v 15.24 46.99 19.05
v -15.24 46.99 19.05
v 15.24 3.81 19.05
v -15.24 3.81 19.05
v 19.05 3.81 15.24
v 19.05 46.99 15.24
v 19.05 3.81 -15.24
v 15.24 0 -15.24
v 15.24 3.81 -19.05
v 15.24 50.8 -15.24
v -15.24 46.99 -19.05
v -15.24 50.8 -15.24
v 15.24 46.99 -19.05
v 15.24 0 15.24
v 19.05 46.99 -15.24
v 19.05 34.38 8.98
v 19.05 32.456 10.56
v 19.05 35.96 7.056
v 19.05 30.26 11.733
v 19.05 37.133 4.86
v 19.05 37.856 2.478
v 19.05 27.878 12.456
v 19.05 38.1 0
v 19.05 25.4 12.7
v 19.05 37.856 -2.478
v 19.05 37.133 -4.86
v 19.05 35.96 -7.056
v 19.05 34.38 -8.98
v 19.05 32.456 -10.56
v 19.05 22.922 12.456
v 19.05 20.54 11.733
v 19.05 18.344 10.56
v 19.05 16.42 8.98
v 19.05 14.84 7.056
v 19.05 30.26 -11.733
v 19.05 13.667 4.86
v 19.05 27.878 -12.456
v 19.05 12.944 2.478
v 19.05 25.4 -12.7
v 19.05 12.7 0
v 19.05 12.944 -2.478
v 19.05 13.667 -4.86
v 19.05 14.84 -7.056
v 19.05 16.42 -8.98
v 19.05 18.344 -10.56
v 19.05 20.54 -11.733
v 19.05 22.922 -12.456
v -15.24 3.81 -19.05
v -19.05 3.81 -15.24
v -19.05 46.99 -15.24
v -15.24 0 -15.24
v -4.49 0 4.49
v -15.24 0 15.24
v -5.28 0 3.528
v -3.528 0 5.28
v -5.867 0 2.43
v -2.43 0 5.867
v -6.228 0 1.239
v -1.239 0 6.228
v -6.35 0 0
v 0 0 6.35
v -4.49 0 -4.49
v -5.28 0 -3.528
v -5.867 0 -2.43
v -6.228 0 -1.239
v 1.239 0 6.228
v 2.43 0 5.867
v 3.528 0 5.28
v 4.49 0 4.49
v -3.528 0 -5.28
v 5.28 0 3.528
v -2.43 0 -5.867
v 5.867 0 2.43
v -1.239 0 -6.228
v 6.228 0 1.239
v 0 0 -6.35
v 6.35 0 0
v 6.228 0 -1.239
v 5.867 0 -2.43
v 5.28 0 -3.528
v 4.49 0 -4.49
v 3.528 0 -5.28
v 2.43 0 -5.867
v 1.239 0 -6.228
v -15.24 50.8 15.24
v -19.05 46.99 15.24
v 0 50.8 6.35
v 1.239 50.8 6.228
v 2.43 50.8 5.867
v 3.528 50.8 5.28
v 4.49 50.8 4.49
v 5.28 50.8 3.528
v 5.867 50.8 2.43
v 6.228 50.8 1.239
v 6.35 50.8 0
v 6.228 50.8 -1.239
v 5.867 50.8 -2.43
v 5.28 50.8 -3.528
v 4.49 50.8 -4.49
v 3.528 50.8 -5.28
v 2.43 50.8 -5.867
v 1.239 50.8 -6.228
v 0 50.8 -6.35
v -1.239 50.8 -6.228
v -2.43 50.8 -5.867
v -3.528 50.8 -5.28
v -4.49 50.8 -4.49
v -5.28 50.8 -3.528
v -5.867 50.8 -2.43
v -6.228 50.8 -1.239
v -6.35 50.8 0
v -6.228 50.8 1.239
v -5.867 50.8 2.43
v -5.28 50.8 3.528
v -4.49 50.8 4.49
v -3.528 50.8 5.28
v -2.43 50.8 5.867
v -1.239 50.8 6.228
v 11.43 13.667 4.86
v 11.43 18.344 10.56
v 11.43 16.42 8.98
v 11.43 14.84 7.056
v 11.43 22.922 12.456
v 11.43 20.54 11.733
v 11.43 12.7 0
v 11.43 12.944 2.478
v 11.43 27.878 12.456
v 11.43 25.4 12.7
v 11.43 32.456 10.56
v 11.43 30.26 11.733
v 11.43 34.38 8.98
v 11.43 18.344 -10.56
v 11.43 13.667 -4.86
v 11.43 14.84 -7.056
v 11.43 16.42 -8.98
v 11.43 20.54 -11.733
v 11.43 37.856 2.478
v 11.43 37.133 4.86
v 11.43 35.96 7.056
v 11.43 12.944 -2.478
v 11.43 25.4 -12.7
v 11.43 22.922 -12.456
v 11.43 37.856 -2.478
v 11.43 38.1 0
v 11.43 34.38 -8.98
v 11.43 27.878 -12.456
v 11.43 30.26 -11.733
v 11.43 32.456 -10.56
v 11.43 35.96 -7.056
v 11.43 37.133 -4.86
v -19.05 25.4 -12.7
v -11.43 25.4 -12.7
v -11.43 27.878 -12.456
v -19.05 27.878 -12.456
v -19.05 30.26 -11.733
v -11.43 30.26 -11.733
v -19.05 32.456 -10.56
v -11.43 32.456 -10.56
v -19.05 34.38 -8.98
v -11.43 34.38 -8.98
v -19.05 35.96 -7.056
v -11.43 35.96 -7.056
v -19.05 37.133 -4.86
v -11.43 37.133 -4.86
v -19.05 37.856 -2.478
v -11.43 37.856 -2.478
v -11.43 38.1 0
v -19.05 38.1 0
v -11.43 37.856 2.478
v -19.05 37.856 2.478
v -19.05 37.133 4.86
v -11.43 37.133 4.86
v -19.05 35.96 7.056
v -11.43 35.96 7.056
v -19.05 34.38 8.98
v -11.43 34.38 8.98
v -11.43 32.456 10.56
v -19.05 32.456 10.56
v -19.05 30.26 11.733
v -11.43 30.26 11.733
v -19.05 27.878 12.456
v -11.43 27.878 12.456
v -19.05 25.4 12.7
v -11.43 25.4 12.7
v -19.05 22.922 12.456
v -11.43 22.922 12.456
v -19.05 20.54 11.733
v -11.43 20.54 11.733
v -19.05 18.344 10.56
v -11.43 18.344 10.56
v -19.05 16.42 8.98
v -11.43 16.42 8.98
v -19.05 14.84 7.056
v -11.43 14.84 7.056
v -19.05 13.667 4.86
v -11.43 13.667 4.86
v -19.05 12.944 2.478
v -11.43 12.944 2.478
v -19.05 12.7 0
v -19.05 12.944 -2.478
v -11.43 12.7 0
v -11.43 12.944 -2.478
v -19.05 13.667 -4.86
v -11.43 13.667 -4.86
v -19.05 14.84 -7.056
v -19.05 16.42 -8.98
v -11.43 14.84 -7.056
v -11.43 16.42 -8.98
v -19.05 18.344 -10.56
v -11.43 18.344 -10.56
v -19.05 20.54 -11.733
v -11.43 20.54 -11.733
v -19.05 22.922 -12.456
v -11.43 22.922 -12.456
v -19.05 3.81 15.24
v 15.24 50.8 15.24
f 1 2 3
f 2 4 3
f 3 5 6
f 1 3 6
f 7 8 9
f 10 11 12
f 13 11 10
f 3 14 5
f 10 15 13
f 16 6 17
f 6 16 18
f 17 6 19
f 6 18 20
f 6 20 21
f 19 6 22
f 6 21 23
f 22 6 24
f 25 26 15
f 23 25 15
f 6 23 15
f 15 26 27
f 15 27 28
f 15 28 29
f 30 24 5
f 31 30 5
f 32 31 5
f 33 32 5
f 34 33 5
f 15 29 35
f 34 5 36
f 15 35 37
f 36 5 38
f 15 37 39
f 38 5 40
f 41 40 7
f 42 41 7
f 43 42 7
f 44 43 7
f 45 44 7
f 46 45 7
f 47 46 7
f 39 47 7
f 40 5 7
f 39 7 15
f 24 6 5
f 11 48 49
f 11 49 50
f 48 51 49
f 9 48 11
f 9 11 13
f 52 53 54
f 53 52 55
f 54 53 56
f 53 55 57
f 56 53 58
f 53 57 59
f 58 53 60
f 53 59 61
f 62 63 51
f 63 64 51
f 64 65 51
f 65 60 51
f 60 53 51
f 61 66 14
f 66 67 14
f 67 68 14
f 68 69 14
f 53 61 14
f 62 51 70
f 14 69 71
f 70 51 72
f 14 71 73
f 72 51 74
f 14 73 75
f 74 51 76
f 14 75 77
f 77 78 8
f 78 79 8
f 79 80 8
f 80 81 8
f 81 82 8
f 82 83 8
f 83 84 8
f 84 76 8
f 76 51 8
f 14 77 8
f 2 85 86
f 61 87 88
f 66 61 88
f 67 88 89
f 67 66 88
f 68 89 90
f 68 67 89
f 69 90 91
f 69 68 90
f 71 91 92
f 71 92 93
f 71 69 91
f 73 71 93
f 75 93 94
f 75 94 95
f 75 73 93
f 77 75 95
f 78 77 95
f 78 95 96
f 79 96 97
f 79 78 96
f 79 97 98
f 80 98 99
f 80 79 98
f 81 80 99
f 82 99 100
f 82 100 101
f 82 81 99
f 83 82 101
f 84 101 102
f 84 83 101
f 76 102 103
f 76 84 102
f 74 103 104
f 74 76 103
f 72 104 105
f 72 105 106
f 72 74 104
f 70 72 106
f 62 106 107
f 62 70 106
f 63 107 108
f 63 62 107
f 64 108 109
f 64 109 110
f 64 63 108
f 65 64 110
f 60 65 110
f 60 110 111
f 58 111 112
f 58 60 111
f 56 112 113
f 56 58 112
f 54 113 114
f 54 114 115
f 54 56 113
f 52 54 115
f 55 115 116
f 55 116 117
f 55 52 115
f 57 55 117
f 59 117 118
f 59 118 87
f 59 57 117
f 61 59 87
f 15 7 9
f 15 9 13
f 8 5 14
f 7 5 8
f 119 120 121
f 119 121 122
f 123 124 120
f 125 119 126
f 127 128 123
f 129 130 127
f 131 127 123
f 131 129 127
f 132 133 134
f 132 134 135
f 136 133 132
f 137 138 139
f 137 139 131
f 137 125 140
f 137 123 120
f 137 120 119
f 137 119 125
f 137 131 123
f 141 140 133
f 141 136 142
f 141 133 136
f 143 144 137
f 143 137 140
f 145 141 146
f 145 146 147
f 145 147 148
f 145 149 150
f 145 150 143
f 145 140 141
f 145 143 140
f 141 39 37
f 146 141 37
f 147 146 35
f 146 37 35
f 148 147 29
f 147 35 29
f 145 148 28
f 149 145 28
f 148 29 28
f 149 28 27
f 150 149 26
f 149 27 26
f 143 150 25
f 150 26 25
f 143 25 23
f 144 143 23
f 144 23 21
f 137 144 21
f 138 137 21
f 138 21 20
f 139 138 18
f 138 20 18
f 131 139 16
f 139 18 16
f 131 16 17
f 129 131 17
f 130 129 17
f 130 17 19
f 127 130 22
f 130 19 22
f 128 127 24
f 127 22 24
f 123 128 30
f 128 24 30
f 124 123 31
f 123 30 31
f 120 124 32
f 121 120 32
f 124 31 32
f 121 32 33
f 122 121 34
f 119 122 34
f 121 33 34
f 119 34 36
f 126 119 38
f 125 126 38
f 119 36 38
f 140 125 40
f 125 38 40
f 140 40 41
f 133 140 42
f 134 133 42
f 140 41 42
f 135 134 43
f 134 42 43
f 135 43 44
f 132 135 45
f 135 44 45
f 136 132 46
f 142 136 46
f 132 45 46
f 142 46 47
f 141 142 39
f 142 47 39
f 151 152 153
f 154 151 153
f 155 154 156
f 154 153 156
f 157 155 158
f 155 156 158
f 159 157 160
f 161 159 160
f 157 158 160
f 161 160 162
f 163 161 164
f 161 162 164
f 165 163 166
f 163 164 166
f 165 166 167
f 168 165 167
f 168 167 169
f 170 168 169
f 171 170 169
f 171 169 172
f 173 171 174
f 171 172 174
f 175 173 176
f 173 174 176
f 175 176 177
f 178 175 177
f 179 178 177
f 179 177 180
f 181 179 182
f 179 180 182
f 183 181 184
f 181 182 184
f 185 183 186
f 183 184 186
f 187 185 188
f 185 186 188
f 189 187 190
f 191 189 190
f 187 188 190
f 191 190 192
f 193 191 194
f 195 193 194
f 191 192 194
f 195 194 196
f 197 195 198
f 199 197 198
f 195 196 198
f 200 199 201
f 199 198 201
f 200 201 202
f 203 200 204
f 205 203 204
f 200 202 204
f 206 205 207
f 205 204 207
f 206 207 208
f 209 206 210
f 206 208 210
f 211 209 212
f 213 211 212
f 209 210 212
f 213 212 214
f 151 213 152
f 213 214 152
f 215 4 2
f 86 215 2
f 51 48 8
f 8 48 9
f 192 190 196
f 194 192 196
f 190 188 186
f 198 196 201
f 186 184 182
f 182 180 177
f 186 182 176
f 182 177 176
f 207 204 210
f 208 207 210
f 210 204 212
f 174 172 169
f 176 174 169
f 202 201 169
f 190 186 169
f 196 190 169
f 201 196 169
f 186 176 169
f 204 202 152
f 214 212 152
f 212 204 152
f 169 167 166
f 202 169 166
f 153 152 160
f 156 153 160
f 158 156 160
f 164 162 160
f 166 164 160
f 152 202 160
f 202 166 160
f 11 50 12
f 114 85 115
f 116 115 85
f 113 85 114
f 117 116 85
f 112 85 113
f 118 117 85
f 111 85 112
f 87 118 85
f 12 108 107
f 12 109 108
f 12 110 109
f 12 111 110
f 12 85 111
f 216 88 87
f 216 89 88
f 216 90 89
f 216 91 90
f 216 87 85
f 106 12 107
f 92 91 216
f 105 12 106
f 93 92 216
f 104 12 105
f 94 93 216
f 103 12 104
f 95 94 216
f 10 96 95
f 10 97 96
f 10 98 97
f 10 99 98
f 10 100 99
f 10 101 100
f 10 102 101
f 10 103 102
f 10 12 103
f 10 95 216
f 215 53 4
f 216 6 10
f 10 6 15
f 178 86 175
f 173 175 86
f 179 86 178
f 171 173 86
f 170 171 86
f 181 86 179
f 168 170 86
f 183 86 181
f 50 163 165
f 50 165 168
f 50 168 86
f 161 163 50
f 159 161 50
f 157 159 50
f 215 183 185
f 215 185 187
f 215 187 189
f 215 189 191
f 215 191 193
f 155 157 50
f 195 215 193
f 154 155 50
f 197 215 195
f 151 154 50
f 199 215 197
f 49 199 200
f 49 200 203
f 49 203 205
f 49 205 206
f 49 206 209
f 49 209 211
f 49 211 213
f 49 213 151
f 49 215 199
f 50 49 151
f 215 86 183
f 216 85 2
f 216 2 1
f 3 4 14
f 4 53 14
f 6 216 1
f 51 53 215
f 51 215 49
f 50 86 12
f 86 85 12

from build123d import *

# Parameters (mm, degrees)
SKETCH1_W           = 38.1
SKETCH1_H           = 38.1
SKETCH1_R           = 6.35
BOSS_EXTRUDE1_DEPTH = 50.8
CUT_EXTRUDE1_START  = 19.05
SKETCH2_R           = 12.7
CUT_EXTRUDE1_DEPTH  = 7.62
CUT_EXTRUDE2_START  = -11.43
SKETCH2_2_R         = 12.7
CUT_EXTRUDE2_DEPTH  = 7.62
CHAMFER1_SIZE       = 3.81


with BuildPart() as part:
    # Sketch1 → Boss-Extrude1 (new body)
    with BuildSketch(Plane(origin=(0, 0, 0), x_dir=(1, 0, 0), z_dir=(0, 1, 0))):
        Rectangle(SKETCH1_W, SKETCH1_H)
        with Locations(Location((0, 0, 0), (0, 0, 270))):
            Circle(SKETCH1_R, mode=Mode.SUBTRACT)
    extrude(amount=BOSS_EXTRUDE1_DEPTH)

    # Sketch2 → Cut-Extrude1 (cut)
    with BuildSketch(Plane(origin=(0, 0, 0), x_dir=(0, 0, -1), z_dir=(1, 0, 0)).offset(CUT_EXTRUDE1_START)):
        with Locations((0, 25.4)):
            Circle(SKETCH2_R)
    extrude(amount=-CUT_EXTRUDE1_DEPTH, mode=Mode.SUBTRACT)

    # Sketch2<2> → Cut-Extrude2 (cut)
    with BuildSketch(Plane(origin=(0, 0, 0), x_dir=(0, 0, -1), z_dir=(1, 0, 0)).offset(CUT_EXTRUDE2_START)):
        with Locations((0, 25.4)):
            Circle(SKETCH2_2_R)
    extrude(amount=-CUT_EXTRUDE2_DEPTH, mode=Mode.SUBTRACT)

    # Chamfer1
    chamfer1_edges = [part.edges().sort_by_distance(p)[0] for p in [
        (-19.05, 50.8, 0),
        (0, 50.8, 19.05),
        (19.05, 50.8, 0),
        (0, 0, 19.05),
        (-19.05, 0, 0),
        (0, 0, -19.05),
        (19.05, 0, 0),
        (19.05, 25.4, 19.05),
        (-19.05, 25.4, 19.05),
        (-19.05, 25.4, -19.05),
        (19.05, 25.4, -19.05),
        (0, 50.8, -19.05),
    ]]
    chamfer(chamfer1_edges, length=CHAMFER1_SIZE)


solid = part.part
